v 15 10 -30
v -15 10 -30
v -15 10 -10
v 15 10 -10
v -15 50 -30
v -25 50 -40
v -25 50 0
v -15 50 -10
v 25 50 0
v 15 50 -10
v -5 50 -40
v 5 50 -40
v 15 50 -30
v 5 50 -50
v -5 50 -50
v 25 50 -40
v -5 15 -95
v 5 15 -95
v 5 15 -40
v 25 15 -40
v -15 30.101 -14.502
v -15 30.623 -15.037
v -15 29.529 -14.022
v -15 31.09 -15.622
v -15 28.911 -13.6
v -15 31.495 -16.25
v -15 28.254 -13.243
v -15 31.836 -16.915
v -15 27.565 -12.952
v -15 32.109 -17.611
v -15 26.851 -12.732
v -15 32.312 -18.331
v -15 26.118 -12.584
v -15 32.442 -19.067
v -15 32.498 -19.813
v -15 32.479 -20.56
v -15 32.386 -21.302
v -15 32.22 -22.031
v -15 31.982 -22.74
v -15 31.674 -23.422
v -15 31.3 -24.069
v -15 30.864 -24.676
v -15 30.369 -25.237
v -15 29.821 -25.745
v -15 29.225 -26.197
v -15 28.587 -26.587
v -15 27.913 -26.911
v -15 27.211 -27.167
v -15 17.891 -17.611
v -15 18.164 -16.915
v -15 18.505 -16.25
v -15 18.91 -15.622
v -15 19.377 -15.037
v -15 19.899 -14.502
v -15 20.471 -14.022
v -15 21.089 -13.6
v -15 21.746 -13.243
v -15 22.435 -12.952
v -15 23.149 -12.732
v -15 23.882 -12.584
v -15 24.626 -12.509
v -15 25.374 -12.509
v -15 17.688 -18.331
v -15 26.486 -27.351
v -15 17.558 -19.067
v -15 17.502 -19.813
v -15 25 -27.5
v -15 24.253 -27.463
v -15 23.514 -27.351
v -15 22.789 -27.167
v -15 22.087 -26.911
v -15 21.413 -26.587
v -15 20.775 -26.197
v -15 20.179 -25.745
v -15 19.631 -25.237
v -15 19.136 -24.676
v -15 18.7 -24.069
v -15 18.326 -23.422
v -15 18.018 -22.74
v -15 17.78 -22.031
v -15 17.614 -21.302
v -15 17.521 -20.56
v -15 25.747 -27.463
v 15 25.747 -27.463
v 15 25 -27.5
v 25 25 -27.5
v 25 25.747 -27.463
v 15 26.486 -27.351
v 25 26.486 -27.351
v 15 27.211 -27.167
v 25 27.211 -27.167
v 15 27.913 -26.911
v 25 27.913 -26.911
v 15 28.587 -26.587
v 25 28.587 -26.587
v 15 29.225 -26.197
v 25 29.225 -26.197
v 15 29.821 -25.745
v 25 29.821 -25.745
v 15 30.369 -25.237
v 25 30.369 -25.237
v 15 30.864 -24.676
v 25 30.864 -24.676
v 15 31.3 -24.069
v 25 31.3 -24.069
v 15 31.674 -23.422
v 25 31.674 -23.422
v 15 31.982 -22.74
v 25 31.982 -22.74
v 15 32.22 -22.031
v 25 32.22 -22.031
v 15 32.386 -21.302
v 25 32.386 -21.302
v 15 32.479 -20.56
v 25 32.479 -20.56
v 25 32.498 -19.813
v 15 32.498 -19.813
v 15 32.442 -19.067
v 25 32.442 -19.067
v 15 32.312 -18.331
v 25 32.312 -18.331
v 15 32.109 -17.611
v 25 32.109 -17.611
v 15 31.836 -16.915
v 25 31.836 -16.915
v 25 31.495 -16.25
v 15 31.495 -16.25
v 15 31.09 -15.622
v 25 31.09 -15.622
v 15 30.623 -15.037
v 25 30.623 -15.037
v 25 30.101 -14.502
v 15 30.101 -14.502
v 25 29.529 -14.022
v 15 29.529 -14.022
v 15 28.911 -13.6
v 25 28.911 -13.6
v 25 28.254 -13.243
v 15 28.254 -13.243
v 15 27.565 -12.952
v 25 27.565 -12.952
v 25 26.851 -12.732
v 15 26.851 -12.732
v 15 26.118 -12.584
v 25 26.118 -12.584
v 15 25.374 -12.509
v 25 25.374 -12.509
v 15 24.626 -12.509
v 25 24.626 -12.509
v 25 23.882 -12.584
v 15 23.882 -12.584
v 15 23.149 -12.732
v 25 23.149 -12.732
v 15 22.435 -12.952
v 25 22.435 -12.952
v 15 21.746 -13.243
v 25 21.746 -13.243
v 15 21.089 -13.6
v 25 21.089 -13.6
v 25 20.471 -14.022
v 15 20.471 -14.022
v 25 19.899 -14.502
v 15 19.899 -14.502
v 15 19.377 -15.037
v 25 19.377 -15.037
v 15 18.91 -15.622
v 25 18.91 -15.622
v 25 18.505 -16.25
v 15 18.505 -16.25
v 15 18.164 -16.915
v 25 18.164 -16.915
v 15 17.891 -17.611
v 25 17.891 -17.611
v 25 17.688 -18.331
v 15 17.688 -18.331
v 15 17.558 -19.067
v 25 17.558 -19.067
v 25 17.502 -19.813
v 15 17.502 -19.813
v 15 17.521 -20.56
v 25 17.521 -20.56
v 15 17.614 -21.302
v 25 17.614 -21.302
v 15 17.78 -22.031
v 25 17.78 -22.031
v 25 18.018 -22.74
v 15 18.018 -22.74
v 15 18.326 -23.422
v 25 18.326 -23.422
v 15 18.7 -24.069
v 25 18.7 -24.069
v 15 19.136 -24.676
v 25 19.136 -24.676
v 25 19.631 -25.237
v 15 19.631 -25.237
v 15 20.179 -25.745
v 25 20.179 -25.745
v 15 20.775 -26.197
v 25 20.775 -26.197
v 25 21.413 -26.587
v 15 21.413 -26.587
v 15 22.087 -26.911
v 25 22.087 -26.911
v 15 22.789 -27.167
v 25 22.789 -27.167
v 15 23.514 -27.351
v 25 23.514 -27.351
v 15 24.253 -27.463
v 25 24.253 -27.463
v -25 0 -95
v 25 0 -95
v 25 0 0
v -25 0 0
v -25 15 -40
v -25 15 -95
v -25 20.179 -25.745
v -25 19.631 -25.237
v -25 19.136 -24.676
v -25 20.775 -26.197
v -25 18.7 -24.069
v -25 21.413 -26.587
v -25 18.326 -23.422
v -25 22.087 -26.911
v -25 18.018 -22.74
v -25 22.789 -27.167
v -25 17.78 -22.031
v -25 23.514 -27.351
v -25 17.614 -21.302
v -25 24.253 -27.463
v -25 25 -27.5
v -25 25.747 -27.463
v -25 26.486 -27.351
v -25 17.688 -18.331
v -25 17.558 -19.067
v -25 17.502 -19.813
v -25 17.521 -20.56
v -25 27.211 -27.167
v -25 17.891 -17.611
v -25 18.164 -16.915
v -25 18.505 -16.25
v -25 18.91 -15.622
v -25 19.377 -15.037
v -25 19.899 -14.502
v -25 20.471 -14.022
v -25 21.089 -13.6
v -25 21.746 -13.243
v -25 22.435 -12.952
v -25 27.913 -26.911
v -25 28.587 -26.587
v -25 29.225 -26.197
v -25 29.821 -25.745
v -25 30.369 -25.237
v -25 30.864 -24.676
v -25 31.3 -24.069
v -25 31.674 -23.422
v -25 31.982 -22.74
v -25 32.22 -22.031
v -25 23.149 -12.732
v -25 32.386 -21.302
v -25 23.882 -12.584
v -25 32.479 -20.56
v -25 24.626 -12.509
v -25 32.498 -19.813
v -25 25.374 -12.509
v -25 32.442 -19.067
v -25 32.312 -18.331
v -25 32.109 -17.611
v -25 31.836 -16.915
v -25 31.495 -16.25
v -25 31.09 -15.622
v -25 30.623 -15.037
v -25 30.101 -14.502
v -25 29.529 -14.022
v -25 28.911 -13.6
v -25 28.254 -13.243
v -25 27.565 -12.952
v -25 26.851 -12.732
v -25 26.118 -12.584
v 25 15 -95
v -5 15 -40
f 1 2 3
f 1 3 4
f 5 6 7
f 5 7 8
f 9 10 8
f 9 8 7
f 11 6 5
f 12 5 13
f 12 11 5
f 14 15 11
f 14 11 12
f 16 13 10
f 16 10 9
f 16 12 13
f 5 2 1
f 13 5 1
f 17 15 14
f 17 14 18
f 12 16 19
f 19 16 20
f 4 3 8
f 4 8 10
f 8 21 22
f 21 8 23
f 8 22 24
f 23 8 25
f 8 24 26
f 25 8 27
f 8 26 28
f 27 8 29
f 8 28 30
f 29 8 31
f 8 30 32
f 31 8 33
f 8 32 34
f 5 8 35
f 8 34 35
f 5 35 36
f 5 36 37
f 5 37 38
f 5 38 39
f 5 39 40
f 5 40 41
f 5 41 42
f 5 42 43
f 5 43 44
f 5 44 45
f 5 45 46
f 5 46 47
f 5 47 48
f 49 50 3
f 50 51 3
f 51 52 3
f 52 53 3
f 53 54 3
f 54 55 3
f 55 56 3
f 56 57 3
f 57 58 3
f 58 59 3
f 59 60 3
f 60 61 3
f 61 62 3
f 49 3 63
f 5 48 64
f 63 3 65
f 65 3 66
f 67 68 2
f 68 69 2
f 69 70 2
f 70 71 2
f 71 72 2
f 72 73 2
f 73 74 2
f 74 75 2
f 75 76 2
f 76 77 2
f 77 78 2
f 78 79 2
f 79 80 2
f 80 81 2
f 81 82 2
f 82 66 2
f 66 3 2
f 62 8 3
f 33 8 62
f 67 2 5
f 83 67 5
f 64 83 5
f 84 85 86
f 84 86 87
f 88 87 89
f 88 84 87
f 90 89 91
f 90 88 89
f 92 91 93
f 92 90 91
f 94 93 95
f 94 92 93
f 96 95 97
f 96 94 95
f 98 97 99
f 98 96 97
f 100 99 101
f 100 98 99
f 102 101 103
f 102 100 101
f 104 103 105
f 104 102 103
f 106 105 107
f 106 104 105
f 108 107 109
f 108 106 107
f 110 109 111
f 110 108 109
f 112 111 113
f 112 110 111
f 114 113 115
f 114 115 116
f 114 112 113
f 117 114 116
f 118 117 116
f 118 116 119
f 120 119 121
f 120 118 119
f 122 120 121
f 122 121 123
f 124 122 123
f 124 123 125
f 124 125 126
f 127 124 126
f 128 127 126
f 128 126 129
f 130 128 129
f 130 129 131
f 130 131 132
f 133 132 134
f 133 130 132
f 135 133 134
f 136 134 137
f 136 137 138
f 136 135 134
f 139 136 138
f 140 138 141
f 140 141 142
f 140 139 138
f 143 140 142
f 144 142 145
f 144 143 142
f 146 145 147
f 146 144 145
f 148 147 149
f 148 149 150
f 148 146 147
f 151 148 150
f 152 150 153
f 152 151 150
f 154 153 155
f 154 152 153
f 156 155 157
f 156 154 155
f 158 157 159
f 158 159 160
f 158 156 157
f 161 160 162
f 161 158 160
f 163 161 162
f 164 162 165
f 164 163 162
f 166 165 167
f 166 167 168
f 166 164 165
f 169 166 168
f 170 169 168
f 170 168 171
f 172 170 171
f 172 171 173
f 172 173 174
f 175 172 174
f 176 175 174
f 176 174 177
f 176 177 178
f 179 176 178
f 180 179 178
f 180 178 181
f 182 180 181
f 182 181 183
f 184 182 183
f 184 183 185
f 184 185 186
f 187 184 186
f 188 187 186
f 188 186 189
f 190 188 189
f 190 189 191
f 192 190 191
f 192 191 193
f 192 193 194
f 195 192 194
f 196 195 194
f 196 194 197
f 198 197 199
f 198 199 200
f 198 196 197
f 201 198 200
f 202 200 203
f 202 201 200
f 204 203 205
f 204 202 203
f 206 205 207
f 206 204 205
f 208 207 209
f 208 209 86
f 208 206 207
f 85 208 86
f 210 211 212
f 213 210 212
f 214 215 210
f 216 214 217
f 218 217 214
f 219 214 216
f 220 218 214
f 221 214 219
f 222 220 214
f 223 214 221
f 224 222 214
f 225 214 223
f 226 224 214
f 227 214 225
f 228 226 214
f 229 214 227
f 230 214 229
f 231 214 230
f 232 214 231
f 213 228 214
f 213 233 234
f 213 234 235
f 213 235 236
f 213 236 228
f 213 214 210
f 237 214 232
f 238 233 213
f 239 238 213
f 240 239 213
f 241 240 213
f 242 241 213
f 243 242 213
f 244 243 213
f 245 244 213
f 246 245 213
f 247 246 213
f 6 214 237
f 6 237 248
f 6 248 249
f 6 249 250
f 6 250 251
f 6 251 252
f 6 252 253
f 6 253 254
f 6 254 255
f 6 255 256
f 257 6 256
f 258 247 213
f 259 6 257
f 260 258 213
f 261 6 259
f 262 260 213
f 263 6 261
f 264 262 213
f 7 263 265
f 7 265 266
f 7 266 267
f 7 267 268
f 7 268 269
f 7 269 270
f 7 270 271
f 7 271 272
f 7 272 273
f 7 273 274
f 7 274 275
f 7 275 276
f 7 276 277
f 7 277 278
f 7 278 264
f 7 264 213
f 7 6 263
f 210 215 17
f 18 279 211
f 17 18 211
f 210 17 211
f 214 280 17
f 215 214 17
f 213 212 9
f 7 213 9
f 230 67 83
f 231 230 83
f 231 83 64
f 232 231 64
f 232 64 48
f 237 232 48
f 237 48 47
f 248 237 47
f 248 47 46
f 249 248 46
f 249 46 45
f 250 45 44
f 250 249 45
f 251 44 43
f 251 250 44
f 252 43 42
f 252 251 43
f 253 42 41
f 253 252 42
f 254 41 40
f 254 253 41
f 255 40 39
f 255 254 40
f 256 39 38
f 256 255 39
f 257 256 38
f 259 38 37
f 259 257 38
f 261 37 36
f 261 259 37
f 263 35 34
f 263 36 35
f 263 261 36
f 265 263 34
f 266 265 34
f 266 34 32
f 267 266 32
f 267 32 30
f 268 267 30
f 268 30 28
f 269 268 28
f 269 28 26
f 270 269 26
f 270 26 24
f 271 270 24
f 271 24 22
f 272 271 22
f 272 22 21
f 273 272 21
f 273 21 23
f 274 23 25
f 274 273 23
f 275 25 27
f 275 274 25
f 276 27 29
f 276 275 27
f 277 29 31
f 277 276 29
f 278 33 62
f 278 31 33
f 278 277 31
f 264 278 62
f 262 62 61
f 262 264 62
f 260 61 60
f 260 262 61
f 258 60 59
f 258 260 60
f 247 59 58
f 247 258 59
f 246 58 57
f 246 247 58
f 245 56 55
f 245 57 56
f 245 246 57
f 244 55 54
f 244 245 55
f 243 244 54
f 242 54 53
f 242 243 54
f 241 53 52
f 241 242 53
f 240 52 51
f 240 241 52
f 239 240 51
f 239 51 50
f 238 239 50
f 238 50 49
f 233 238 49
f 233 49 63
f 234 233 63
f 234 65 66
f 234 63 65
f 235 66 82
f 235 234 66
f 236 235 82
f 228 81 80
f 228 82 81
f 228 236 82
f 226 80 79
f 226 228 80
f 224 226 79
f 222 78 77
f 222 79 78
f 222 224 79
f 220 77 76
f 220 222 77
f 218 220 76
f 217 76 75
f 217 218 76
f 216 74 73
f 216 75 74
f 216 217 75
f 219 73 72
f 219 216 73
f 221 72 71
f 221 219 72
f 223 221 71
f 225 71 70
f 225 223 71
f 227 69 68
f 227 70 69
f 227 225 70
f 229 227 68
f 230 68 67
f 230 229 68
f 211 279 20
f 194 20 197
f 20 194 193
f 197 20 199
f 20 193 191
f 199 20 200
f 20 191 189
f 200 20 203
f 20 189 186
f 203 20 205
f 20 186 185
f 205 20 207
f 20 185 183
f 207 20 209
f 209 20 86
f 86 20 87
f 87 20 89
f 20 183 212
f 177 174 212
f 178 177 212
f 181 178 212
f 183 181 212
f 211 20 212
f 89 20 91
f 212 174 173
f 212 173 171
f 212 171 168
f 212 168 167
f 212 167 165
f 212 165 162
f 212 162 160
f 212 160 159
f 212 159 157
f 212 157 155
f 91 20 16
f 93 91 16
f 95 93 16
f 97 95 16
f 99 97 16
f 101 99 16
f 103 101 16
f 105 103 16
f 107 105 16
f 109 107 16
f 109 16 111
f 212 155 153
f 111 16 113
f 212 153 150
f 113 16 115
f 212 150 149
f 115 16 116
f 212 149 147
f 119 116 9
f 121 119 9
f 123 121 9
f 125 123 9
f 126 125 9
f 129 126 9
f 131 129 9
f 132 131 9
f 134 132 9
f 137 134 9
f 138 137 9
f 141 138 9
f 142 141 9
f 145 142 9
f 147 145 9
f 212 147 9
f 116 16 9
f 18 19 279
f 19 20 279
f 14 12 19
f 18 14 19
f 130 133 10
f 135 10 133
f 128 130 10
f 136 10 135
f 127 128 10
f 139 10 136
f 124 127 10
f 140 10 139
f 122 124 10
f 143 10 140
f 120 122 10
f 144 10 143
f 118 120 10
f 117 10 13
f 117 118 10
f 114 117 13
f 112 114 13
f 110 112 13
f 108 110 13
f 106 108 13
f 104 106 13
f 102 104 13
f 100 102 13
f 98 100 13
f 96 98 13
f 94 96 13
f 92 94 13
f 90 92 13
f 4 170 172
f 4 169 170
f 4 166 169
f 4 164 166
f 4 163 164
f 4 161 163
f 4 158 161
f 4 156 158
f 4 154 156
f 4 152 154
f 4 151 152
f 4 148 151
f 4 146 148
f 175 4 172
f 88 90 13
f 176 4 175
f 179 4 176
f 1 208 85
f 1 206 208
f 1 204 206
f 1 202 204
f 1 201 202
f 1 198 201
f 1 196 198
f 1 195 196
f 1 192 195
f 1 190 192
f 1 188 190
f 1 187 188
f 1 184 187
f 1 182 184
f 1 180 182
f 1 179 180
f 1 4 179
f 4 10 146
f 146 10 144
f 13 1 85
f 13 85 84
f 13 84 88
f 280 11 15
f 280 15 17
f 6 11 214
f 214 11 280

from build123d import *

# Parameters (mm, degrees)
SKETCH2_R               = 7.5
BOSS_EXTRUDE1_DEPTH     = 25
CUT_EXTRUDE1_DEPTH      = 111.227038425
CUT_EXTRUDE1_DEPTH_BACK = 40
SKETCH3_W               = 30
SKETCH3_H               = 20
SKETCH4_W               = 10
SKETCH4_H               = 10
BOSS_EXTRUDE2_DEPTH     = 40
RIB36_REACH             = 112.227
SKETCH12_WALL_W         = 279.462848106
SKETCH12_WALL_H         = 10


with BuildPart() as part:
    # Sketch2 → Boss-Extrude1 (new, symmetric)
    with BuildSketch(Plane(origin=(0, 0, 0), x_dir=(0, 0, -1), z_dir=(1, 0, 0))):
        Polygon((0, 50), (40, 50), (40, 15), (95, 15), (95, 0), (0, 0), align=None)
        with Locations((20, 25)):
            Circle(SKETCH2_R, mode=Mode.SUBTRACT)
    extrude(amount=BOSS_EXTRUDE1_DEPTH, both=True)

    # Sketch3 → Cut-Extrude1 (cut, two sides: drawn at the far end of the back side and taken through both)
    with BuildSketch(Plane(origin=(0, 50, 0), x_dir=(1, 0, 0), z_dir=(0, 1, 0)).offset(-CUT_EXTRUDE1_DEPTH_BACK)):
        with Locations((0, 20)):
            Rectangle(SKETCH3_W, SKETCH3_H)
    extrude(amount=CUT_EXTRUDE1_DEPTH + CUT_EXTRUDE1_DEPTH_BACK, mode=Mode.SUBTRACT)

    # Sketch4 → Boss-Extrude2 (add)
    with BuildSketch(Plane(origin=(0, 50, 0), x_dir=(1, 0, 0), z_dir=(0, 1, 0))):
        with Locations((0, 45)):
            Rectangle(SKETCH4_W, SKETCH4_H)
    extrude(amount=-BOSS_EXTRUDE2_DEPTH)

    # Sketch12 wall → Rib36 (add, up to next)
    with BuildSketch(Plane(origin=(0, 32.5, -72.5), x_dir=(0, -0.613940613515, -0.789352217376), z_dir=(0, 0.789352217376, -0.613940613515)), mode=Mode.PRIVATE) as rib36_sk1:
        Rectangle(SKETCH12_WALL_W, SKETCH12_WALL_H)
    rib36_tool1 = extrude(rib36_sk1.sketch, amount=-RIB36_REACH, mode=Mode.PRIVATE) - part.part
    add(rib36_tool1.solids().sort_by_distance((0, 32.5, -72.5))[0])


solid = part.part
